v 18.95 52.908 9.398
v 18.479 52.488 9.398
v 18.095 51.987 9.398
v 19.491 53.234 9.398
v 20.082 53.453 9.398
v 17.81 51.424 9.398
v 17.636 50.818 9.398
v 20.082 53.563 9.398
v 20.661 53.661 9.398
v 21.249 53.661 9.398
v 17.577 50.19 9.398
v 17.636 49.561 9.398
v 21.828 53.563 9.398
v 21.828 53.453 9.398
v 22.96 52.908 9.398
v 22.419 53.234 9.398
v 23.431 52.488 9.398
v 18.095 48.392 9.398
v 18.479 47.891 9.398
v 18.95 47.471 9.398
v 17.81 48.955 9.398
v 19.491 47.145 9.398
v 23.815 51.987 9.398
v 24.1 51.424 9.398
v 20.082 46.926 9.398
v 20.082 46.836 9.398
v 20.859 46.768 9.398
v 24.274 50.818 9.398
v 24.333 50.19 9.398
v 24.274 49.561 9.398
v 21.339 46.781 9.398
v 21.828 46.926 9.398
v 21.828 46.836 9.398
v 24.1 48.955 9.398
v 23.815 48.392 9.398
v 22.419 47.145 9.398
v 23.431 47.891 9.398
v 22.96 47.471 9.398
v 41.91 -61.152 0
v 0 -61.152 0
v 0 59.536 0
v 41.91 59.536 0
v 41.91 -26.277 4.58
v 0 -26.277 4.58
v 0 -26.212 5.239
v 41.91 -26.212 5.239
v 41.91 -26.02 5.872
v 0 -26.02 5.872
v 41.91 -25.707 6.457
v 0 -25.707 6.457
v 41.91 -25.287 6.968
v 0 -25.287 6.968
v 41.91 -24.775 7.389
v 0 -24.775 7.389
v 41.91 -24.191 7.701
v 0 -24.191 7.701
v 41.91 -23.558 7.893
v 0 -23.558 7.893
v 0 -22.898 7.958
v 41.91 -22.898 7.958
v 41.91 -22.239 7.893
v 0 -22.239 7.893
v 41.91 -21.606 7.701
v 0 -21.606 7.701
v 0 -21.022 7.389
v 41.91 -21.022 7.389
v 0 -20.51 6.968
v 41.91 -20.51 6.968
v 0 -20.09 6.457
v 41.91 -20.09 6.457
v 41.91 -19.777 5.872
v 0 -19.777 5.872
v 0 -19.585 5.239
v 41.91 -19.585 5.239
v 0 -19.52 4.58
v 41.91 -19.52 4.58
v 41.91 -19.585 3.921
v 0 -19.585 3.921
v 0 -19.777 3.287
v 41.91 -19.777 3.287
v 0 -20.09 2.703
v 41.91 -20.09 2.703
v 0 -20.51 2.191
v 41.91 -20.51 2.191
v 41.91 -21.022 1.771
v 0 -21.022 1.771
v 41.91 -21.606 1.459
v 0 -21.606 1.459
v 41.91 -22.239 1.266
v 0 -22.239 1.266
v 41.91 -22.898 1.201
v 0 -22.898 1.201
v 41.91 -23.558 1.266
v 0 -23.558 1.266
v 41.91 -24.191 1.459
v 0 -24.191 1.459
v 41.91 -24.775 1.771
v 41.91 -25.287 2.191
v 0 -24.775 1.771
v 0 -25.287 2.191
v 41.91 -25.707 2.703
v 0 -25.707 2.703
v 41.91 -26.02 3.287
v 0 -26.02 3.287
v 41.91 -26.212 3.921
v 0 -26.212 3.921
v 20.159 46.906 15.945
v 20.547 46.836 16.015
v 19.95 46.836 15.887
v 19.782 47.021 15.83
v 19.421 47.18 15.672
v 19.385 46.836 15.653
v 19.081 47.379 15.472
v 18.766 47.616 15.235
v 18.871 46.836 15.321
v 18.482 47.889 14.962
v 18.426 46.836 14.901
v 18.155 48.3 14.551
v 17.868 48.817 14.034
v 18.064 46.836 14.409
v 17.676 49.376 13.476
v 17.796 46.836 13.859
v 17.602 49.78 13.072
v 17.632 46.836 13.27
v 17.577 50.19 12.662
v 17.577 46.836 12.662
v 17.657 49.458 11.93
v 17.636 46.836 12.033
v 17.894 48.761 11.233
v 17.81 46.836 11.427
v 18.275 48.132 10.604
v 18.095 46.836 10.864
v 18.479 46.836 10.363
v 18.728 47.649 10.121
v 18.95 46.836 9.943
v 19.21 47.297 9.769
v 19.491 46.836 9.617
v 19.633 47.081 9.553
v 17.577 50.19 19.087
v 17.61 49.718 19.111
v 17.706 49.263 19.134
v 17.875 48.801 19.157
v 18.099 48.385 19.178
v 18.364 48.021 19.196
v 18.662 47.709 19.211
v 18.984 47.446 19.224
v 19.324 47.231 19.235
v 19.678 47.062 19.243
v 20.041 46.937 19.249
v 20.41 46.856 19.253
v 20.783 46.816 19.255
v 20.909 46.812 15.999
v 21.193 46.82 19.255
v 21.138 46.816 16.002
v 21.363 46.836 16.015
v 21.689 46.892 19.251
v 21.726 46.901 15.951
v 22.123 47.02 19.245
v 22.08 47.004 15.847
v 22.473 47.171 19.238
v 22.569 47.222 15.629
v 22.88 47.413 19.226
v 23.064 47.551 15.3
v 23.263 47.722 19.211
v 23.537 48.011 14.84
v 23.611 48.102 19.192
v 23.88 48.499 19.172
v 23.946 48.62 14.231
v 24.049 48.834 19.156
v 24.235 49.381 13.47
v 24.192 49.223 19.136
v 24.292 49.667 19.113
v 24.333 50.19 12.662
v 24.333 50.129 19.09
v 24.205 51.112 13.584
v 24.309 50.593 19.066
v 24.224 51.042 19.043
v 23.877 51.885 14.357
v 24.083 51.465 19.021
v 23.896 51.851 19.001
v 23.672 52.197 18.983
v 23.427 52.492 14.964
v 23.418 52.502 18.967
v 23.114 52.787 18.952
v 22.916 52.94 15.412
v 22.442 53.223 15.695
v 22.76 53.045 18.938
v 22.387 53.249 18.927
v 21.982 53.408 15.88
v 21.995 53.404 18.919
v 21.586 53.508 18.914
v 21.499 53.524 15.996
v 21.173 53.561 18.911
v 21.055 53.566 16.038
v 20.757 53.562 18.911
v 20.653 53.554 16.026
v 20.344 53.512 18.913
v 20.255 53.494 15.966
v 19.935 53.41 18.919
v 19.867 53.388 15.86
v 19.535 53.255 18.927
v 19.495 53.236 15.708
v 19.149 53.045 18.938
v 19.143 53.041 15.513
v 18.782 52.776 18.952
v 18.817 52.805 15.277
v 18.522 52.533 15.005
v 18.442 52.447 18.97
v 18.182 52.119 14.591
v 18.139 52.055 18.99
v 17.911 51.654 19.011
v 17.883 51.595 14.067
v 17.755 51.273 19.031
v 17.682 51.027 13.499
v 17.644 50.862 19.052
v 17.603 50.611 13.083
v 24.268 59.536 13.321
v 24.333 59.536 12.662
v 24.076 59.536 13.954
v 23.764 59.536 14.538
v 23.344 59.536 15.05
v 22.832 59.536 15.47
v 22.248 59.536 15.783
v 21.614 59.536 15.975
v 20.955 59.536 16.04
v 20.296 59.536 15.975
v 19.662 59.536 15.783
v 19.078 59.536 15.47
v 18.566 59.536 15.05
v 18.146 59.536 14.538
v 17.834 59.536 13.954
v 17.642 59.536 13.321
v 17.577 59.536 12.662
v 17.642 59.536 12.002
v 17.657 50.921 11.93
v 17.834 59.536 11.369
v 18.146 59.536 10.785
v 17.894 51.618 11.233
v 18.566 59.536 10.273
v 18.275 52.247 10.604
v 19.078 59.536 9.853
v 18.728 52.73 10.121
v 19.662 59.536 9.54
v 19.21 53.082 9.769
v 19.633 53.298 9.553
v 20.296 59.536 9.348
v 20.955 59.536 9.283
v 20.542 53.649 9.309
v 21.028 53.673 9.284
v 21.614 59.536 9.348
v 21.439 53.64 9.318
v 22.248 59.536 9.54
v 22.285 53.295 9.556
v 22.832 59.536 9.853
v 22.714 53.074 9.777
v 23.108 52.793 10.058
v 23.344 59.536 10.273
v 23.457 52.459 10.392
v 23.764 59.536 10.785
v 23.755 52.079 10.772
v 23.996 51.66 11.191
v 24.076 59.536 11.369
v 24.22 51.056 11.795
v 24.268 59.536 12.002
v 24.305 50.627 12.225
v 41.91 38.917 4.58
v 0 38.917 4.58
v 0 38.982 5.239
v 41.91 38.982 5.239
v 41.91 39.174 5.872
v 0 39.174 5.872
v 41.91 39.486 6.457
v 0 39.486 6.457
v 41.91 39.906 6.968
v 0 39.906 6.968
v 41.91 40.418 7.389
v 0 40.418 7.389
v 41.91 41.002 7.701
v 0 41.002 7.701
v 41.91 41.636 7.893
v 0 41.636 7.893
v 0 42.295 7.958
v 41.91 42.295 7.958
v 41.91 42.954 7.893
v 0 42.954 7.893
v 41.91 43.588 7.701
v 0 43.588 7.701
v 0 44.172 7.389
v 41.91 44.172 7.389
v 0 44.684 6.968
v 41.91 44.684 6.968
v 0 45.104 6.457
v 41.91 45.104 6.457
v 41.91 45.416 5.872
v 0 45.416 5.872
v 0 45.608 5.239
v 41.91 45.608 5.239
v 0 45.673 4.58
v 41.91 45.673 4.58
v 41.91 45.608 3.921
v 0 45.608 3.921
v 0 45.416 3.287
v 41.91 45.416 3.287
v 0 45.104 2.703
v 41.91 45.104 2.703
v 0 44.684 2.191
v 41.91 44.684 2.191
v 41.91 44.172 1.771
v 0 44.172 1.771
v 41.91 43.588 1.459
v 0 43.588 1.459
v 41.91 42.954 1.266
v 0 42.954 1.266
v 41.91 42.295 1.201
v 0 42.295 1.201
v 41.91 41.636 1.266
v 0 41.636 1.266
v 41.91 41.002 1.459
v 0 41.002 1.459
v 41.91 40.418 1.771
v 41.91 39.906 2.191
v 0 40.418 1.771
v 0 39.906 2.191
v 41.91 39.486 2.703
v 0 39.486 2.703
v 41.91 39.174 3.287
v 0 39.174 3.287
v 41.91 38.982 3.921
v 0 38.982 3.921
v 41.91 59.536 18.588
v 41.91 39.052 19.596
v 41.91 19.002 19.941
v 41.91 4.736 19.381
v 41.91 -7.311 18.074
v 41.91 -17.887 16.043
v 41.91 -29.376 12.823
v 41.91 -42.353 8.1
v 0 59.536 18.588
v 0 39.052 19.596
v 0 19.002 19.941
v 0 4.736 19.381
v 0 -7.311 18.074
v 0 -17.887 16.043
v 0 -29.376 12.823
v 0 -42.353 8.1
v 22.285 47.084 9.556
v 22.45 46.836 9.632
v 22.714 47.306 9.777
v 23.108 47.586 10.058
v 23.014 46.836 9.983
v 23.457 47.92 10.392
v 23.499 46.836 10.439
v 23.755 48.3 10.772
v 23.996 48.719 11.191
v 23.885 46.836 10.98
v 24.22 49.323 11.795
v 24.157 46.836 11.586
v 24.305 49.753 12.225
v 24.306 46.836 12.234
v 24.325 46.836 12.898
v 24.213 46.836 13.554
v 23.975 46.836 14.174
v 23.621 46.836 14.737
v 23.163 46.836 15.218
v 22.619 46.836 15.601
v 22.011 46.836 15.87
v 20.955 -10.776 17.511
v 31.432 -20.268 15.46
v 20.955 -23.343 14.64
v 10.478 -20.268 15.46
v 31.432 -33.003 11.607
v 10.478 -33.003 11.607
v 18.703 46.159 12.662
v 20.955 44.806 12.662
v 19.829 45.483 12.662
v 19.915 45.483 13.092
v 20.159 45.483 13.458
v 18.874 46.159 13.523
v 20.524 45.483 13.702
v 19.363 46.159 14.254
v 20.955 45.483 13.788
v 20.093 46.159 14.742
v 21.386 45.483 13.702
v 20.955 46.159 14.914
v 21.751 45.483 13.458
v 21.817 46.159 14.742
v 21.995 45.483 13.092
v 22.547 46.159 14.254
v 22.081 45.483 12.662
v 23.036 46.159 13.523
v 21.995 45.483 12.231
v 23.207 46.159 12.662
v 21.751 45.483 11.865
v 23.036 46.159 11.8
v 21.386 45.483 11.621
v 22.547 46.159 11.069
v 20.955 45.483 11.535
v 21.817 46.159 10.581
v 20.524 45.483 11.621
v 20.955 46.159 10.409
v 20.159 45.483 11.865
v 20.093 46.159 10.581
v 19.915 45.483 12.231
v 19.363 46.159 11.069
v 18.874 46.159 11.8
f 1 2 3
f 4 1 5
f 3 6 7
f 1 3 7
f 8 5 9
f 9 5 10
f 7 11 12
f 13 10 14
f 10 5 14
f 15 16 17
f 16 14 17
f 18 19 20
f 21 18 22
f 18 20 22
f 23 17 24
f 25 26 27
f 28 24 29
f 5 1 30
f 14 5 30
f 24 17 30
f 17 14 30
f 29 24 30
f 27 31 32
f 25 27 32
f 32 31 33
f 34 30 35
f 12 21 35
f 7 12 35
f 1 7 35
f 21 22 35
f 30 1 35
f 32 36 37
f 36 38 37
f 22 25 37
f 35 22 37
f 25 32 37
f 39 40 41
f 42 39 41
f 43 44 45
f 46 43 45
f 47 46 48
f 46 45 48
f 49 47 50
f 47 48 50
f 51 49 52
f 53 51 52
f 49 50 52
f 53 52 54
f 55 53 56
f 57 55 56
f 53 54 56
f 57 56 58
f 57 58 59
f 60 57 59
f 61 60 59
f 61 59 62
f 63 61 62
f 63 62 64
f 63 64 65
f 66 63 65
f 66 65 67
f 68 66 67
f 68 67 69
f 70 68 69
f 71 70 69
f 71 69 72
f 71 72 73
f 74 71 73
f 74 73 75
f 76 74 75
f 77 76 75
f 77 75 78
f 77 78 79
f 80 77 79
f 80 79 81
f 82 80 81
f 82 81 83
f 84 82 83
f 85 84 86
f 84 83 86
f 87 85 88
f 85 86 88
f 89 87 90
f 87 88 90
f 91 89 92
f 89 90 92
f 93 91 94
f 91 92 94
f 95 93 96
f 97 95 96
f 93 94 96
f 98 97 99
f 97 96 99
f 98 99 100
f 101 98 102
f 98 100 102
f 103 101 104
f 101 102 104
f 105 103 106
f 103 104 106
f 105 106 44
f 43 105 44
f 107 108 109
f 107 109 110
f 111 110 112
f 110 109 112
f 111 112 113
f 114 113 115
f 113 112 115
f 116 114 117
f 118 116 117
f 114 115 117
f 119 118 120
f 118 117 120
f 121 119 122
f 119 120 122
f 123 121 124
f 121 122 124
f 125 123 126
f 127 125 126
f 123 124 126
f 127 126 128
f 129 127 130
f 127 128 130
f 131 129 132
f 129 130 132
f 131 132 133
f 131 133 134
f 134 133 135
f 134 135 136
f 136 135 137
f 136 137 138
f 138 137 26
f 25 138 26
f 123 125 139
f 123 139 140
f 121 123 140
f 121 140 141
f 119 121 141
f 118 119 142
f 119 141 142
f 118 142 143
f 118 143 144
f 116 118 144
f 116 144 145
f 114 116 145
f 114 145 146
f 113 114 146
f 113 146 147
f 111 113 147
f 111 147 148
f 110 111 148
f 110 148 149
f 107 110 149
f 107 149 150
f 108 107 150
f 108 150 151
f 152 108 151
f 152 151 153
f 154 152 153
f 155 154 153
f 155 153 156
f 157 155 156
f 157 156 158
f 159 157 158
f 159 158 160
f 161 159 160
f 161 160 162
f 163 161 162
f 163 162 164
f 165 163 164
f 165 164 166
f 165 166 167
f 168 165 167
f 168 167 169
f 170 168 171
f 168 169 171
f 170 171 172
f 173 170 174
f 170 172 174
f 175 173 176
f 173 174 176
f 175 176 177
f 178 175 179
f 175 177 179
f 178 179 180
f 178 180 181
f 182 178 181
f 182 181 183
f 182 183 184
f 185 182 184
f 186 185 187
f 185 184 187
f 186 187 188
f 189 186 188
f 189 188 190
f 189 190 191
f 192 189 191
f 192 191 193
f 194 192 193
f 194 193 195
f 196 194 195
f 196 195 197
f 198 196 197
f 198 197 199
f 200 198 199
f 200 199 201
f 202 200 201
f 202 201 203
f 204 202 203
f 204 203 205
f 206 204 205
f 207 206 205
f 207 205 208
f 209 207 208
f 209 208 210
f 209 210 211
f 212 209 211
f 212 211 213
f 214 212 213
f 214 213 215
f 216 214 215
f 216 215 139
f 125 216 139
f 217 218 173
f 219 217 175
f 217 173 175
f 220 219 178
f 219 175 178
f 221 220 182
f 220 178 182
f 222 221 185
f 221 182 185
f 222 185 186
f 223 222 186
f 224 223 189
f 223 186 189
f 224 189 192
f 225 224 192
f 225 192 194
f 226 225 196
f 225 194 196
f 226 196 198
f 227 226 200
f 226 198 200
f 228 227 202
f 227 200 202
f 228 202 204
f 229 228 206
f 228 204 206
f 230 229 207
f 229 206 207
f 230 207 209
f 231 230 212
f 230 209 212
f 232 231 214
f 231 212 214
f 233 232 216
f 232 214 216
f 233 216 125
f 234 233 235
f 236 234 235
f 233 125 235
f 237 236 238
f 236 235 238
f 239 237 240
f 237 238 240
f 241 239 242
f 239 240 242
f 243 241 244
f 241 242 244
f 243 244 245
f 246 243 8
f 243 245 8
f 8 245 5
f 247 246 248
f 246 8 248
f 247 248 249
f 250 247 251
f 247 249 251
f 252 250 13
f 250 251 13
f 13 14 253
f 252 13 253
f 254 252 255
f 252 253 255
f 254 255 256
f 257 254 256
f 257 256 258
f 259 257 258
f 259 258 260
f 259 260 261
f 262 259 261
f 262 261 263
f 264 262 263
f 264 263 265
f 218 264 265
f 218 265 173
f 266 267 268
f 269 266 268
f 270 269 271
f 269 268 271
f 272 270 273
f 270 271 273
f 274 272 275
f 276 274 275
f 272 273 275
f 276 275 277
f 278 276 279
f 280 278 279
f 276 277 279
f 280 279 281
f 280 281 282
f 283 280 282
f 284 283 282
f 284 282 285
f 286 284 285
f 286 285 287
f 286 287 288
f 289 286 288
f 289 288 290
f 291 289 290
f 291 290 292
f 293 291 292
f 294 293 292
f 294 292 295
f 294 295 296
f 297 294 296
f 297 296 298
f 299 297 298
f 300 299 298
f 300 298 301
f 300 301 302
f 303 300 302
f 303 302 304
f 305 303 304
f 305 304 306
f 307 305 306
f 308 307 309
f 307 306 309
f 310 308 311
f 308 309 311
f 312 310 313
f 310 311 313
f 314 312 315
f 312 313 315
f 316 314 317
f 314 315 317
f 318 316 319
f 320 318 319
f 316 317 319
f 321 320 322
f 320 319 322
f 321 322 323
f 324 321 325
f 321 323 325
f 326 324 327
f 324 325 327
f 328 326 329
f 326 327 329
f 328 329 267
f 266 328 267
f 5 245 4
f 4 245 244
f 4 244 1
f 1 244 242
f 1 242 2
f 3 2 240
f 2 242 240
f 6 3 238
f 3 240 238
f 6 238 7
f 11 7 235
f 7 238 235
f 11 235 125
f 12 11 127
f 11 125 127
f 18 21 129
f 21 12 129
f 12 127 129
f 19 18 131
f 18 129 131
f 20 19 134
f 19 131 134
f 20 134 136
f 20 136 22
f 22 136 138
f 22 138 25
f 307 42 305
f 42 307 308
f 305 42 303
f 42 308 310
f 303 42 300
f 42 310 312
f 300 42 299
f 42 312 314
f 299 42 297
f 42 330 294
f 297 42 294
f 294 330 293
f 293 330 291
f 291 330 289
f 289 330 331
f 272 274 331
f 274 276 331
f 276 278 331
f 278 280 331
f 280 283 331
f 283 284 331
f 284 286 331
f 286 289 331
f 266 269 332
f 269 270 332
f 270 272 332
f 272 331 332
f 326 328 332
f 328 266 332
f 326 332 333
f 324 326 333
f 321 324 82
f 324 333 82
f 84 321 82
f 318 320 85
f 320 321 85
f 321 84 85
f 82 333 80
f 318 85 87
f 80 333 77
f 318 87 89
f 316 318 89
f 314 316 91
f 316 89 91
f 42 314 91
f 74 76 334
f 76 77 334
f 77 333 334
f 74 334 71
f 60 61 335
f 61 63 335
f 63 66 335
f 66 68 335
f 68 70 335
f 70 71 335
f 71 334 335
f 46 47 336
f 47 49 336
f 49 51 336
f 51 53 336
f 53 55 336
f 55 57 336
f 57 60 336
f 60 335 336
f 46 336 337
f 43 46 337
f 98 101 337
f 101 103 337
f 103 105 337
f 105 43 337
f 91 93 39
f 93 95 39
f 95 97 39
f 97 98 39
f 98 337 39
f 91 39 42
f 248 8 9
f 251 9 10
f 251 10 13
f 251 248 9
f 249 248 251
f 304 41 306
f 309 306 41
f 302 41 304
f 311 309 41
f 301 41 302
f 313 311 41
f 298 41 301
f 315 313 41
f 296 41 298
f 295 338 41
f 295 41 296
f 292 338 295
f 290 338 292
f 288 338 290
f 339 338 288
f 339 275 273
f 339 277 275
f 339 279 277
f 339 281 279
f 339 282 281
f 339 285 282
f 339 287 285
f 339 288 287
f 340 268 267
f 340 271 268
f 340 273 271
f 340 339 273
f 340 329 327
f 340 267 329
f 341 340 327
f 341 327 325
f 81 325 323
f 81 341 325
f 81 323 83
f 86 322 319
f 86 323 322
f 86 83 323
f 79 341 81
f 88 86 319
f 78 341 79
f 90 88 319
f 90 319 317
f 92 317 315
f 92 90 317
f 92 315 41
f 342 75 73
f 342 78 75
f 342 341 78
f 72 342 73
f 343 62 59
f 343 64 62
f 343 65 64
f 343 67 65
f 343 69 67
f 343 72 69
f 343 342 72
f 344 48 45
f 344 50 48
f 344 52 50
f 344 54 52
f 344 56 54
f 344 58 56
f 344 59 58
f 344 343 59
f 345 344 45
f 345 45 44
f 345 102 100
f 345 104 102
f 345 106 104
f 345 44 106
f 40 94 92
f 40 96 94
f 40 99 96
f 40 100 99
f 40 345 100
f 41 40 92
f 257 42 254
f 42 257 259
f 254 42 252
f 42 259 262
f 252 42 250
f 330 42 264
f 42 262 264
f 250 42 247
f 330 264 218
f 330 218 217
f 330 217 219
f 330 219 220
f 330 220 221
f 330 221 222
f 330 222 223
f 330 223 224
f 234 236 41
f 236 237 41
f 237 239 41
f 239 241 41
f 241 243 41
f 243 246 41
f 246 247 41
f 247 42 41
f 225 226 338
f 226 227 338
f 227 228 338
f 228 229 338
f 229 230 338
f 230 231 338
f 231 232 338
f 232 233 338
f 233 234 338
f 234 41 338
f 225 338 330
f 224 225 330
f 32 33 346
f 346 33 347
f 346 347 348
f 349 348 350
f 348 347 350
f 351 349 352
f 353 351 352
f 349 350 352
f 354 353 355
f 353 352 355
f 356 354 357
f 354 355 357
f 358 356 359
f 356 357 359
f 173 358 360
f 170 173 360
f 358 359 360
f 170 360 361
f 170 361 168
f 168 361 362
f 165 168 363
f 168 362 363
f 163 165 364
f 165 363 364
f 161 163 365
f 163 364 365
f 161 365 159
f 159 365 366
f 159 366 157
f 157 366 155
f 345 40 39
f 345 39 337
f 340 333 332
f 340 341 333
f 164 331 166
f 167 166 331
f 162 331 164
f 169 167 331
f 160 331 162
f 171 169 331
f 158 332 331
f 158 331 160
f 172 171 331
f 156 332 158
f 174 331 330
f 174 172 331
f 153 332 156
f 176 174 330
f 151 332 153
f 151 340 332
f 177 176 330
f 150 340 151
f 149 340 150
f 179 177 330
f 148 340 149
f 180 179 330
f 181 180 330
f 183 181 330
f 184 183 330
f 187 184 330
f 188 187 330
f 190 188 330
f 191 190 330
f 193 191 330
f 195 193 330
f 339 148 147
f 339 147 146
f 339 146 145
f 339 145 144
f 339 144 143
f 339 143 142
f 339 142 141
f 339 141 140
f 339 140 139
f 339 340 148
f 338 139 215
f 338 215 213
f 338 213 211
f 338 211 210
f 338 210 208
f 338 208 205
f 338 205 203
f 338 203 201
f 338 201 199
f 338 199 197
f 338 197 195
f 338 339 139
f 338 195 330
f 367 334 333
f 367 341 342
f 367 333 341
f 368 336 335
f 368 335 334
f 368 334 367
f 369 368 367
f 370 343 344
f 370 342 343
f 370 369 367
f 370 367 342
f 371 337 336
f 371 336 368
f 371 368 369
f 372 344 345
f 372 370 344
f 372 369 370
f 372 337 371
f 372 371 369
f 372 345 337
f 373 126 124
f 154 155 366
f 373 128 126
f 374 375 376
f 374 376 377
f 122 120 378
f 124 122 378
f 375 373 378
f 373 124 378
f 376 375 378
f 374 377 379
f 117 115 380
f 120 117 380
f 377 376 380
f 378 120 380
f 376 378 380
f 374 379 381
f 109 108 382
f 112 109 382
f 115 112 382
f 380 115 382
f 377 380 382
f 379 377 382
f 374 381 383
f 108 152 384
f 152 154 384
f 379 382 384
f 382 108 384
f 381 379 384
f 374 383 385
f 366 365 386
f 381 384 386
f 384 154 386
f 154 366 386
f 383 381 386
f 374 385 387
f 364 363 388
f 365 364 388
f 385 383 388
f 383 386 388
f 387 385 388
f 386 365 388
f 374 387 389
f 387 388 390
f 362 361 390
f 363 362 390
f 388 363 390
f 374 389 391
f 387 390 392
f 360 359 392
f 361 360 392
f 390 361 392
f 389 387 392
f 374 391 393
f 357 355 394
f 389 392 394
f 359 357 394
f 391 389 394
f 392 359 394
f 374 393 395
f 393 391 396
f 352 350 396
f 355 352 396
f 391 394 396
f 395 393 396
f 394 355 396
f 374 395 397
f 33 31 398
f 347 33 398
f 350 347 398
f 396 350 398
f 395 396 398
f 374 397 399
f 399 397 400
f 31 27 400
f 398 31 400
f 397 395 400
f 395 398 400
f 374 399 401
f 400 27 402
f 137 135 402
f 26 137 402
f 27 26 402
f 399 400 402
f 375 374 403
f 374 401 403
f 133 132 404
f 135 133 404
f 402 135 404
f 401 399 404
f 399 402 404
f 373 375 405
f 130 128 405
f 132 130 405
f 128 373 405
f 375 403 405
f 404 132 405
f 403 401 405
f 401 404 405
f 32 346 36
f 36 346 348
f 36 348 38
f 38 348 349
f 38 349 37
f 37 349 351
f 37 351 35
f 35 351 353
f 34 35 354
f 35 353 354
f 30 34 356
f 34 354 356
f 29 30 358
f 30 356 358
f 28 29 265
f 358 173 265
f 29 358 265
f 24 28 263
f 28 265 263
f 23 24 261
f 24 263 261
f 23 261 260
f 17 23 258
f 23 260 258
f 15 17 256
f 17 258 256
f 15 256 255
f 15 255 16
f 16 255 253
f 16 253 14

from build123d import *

# Parameters (mm, degrees)
F1_DEPTH = 41.91
F3_D     = 6.7564
F5_D     = 6.7564
F5_DEPTH = 12.7
F5_TIP   = 2.0298273432
F7_D     = 6.7564
F8_R     = 3.4841261701
F9_DEPTH = 9.398


with BuildPart() as f1:
    # F0 (on Right) → F1 (new body)
    with BuildSketch(Plane.YZ):
        with BuildLine():
            add(Edge.make_bspline(
                [(-61.1524246633, 0), (-45.2024810028, 7.122572143), (-10.9378282084, 22.4237209544), (34.9882428649, 19.9241960467), (59.5360659063, 18.5881815851)],
                knots=[0, 0, 0, 0, 0.4654926392, 1, 1, 1, 1], degree=3))
            Line((-61.1524246633, 0), (59.5360659063, 0))
            Line((59.5360659063, 0), (59.5360659063, 18.5881815851))
        make_face()
    extrude(amount=F1_DEPTH)

    # F3 (through all)
    with Locations(Plane.YZ.offset(41.91)):
        with Locations((-22.8984840214, 4.5796968043), (42.2948487103, 4.5796968043)):
            Hole(F3_D / 2)

    # F5
    with Locations(Plane(origin=(0, 59.5360659063, 0), x_dir=(-1, 0, 0), z_dir=(0, 1, 0))):
        with Locations((-20.955, 12.6615148038)):
            Hole(F5_D / 2, depth=F5_DEPTH)
            with Locations((0, 0, -(F5_DEPTH + F5_TIP / 2))):  # 118° drill point
                Cone(0, F5_D / 2, F5_TIP, mode=Mode.SUBTRACT)

    # F7 (through all)
    with Locations(Plane(origin=(0, 0, 0), x_dir=(1, 0, 0), z_dir=(0, 0, -1))):
        with Locations((20.955, -50.1895733178)):
            Hole(F7_D / 2)

    # F8 (on face) → F9 (join)
    with BuildSketch(Plane(origin=(0, 0, 0), x_dir=(1, 0, 0), z_dir=(0, 0, -1))):
        with Locations((20.955, -50.1895733178)):
            Circle(F8_R)
    extrude(amount=-F9_DEPTH)


solid = f1.part
